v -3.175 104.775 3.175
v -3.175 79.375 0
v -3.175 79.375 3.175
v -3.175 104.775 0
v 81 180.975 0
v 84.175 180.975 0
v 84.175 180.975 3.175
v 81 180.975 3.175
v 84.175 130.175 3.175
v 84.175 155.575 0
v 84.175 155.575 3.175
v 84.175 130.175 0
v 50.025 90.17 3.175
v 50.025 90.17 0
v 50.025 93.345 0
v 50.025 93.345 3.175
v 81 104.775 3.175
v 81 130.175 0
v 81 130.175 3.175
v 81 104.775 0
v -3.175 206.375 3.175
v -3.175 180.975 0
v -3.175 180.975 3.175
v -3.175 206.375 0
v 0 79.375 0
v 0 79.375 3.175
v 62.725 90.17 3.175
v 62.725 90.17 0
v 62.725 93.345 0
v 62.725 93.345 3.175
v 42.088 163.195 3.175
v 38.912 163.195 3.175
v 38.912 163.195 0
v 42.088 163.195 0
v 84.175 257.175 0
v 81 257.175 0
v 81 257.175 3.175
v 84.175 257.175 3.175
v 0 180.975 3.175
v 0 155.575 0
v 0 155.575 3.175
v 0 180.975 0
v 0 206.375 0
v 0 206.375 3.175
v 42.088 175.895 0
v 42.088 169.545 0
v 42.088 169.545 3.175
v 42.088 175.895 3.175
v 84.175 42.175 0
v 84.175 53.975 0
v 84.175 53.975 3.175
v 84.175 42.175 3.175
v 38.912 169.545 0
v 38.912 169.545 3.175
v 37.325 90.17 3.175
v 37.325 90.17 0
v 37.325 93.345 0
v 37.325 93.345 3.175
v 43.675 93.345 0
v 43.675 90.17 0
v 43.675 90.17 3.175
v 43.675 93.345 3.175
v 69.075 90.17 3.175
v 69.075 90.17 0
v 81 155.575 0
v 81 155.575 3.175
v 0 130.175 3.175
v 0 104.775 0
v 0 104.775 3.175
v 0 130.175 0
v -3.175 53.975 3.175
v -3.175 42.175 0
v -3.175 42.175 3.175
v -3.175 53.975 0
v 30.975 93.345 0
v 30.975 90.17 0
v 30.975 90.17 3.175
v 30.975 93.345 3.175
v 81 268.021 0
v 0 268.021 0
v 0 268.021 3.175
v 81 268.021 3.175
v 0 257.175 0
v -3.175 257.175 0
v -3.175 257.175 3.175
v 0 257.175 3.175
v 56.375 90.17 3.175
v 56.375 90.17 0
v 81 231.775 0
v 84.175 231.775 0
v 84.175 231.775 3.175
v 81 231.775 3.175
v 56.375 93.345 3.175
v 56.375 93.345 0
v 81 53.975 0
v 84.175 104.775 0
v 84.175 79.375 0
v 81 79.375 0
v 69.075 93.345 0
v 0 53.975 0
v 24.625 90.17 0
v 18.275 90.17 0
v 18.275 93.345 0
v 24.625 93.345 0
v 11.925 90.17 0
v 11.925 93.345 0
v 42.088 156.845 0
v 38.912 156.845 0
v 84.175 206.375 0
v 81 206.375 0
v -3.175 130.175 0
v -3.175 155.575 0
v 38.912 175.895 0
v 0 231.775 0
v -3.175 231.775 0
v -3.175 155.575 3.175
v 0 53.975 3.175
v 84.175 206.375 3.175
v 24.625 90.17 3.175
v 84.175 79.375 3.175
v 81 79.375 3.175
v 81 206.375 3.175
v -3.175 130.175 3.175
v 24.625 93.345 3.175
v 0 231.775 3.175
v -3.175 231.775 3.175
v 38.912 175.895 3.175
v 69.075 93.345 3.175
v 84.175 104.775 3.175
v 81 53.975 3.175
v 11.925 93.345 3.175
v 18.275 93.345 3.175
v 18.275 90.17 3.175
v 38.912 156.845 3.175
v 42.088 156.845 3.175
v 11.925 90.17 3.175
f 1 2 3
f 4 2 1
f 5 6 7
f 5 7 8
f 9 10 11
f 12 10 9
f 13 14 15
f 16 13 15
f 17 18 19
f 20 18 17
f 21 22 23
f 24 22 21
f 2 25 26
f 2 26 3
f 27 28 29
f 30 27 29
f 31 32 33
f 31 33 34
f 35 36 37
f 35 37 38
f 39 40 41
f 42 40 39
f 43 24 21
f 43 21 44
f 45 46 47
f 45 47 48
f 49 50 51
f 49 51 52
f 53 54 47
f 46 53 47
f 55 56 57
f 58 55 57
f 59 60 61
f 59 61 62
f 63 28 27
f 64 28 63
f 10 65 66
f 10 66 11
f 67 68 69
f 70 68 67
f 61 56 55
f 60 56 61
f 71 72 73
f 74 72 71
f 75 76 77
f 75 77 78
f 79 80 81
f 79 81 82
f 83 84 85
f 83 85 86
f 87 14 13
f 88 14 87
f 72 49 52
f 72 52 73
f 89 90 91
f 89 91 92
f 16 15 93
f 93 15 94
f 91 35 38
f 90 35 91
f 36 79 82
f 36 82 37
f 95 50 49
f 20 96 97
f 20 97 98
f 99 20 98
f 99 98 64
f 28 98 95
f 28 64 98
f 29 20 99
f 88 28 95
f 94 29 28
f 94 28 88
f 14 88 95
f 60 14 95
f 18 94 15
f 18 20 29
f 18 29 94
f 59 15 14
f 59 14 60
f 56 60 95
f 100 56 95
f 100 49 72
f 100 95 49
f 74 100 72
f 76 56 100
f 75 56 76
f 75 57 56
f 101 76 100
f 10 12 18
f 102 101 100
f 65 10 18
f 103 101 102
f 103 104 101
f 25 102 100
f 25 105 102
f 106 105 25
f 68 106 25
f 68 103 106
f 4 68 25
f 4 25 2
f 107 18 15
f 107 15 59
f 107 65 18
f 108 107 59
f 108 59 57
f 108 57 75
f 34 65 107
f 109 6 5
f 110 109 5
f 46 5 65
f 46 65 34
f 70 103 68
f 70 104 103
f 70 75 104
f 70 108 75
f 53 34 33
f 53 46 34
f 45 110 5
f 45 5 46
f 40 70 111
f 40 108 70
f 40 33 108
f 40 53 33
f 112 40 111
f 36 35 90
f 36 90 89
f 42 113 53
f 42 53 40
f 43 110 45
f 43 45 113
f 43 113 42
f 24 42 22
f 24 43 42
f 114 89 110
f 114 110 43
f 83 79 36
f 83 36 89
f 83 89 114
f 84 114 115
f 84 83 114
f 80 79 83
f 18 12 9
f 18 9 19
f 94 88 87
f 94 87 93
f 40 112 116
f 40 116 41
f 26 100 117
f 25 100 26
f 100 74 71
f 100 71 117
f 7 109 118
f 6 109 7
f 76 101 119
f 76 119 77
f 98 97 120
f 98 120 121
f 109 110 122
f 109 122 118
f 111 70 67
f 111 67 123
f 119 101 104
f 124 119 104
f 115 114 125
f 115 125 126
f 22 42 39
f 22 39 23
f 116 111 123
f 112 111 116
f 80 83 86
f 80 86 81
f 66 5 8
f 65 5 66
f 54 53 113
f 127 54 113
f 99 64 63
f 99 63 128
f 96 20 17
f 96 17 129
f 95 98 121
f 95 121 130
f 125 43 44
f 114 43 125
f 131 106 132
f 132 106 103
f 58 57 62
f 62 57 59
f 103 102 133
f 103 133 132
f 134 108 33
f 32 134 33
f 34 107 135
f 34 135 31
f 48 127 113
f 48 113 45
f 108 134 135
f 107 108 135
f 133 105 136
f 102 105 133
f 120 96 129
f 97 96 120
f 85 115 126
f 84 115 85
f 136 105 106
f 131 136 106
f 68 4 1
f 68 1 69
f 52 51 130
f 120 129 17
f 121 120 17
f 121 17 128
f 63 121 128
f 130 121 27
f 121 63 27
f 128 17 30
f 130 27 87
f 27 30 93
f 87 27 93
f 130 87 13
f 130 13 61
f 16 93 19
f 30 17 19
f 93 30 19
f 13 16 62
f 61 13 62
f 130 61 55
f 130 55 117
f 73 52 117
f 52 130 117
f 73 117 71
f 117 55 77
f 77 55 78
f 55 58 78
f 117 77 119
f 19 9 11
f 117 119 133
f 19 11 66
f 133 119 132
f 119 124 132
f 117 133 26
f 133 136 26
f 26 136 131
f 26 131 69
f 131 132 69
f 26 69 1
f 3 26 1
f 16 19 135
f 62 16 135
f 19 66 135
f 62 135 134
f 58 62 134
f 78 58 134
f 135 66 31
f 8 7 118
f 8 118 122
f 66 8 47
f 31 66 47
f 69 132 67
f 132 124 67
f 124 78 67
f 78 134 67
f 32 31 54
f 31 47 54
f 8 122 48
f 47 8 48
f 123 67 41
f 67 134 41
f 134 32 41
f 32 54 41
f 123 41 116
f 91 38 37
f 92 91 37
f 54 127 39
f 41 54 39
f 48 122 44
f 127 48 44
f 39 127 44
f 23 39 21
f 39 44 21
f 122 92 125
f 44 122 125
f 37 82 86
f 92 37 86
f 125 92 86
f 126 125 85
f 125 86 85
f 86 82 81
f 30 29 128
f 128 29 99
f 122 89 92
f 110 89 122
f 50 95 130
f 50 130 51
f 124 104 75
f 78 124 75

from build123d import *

# Parameters (mm, degrees)
SKETCH1_W           = 6.35
SKETCH1_H           = 3.175
SKETCH1_W_2         = 3.175
SKETCH1_H_2         = 6.35
BOSS_EXTRUDE1_DEPTH = 3.175


with BuildPart() as part:
    # Sketch1 → Boss-Extrude1 (new body)
    with BuildSketch(Plane.XY):
        Polygon((0, 268.0208), (81, 268.0208), (81, 257.175), (84.175, 257.175), (84.175, 231.775), (81, 231.775), (81, 206.375), (84.175, 206.375), (84.175, 180.975), (81, 180.975), (81, 155.575), (84.175, 155.575), (84.175, 130.175), (81, 130.175), (81, 104.775), (84.175, 104.775), (84.175, 79.375), (81, 79.375), (81, 53.975), (84.175, 53.975), (84.175, 42.175), (-3.175, 42.175), (-3.175, 53.975), (0, 53.975), (0, 79.375), (-3.175, 79.375), (-3.175, 104.775), (0, 104.775), (0, 130.175), (-3.175, 130.175), (-3.175, 155.575), (0, 155.575), (0, 180.975), (-3.175, 180.975), (-3.175, 206.375), (0, 206.375), (0, 231.775), (-3.175, 231.775), (-3.175, 257.175), (0, 257.175), align=None)
        with Locations((53.2, 91.7575)):
            Rectangle(SKETCH1_W, SKETCH1_H, mode=Mode.SUBTRACT)
        with Locations((40.5, 91.7575)):
            Rectangle(SKETCH1_W, SKETCH1_H, mode=Mode.SUBTRACT)
        with Locations((65.9, 91.7575)):
            Rectangle(SKETCH1_W, SKETCH1_H, mode=Mode.SUBTRACT)
        with Locations((27.8, 91.7575)):
            Rectangle(SKETCH1_W, SKETCH1_H, mode=Mode.SUBTRACT)
        with Locations((15.1, 91.7575)):
            Rectangle(SKETCH1_W, SKETCH1_H, mode=Mode.SUBTRACT)
        with Locations((40.5, 160.02)):
            Rectangle(SKETCH1_W_2, SKETCH1_H_2, mode=Mode.SUBTRACT)
        with Locations((40.5, 172.72)):
            Rectangle(SKETCH1_W_2, SKETCH1_H_2, mode=Mode.SUBTRACT)
    extrude(amount=BOSS_EXTRUDE1_DEPTH)


solid = part.part
